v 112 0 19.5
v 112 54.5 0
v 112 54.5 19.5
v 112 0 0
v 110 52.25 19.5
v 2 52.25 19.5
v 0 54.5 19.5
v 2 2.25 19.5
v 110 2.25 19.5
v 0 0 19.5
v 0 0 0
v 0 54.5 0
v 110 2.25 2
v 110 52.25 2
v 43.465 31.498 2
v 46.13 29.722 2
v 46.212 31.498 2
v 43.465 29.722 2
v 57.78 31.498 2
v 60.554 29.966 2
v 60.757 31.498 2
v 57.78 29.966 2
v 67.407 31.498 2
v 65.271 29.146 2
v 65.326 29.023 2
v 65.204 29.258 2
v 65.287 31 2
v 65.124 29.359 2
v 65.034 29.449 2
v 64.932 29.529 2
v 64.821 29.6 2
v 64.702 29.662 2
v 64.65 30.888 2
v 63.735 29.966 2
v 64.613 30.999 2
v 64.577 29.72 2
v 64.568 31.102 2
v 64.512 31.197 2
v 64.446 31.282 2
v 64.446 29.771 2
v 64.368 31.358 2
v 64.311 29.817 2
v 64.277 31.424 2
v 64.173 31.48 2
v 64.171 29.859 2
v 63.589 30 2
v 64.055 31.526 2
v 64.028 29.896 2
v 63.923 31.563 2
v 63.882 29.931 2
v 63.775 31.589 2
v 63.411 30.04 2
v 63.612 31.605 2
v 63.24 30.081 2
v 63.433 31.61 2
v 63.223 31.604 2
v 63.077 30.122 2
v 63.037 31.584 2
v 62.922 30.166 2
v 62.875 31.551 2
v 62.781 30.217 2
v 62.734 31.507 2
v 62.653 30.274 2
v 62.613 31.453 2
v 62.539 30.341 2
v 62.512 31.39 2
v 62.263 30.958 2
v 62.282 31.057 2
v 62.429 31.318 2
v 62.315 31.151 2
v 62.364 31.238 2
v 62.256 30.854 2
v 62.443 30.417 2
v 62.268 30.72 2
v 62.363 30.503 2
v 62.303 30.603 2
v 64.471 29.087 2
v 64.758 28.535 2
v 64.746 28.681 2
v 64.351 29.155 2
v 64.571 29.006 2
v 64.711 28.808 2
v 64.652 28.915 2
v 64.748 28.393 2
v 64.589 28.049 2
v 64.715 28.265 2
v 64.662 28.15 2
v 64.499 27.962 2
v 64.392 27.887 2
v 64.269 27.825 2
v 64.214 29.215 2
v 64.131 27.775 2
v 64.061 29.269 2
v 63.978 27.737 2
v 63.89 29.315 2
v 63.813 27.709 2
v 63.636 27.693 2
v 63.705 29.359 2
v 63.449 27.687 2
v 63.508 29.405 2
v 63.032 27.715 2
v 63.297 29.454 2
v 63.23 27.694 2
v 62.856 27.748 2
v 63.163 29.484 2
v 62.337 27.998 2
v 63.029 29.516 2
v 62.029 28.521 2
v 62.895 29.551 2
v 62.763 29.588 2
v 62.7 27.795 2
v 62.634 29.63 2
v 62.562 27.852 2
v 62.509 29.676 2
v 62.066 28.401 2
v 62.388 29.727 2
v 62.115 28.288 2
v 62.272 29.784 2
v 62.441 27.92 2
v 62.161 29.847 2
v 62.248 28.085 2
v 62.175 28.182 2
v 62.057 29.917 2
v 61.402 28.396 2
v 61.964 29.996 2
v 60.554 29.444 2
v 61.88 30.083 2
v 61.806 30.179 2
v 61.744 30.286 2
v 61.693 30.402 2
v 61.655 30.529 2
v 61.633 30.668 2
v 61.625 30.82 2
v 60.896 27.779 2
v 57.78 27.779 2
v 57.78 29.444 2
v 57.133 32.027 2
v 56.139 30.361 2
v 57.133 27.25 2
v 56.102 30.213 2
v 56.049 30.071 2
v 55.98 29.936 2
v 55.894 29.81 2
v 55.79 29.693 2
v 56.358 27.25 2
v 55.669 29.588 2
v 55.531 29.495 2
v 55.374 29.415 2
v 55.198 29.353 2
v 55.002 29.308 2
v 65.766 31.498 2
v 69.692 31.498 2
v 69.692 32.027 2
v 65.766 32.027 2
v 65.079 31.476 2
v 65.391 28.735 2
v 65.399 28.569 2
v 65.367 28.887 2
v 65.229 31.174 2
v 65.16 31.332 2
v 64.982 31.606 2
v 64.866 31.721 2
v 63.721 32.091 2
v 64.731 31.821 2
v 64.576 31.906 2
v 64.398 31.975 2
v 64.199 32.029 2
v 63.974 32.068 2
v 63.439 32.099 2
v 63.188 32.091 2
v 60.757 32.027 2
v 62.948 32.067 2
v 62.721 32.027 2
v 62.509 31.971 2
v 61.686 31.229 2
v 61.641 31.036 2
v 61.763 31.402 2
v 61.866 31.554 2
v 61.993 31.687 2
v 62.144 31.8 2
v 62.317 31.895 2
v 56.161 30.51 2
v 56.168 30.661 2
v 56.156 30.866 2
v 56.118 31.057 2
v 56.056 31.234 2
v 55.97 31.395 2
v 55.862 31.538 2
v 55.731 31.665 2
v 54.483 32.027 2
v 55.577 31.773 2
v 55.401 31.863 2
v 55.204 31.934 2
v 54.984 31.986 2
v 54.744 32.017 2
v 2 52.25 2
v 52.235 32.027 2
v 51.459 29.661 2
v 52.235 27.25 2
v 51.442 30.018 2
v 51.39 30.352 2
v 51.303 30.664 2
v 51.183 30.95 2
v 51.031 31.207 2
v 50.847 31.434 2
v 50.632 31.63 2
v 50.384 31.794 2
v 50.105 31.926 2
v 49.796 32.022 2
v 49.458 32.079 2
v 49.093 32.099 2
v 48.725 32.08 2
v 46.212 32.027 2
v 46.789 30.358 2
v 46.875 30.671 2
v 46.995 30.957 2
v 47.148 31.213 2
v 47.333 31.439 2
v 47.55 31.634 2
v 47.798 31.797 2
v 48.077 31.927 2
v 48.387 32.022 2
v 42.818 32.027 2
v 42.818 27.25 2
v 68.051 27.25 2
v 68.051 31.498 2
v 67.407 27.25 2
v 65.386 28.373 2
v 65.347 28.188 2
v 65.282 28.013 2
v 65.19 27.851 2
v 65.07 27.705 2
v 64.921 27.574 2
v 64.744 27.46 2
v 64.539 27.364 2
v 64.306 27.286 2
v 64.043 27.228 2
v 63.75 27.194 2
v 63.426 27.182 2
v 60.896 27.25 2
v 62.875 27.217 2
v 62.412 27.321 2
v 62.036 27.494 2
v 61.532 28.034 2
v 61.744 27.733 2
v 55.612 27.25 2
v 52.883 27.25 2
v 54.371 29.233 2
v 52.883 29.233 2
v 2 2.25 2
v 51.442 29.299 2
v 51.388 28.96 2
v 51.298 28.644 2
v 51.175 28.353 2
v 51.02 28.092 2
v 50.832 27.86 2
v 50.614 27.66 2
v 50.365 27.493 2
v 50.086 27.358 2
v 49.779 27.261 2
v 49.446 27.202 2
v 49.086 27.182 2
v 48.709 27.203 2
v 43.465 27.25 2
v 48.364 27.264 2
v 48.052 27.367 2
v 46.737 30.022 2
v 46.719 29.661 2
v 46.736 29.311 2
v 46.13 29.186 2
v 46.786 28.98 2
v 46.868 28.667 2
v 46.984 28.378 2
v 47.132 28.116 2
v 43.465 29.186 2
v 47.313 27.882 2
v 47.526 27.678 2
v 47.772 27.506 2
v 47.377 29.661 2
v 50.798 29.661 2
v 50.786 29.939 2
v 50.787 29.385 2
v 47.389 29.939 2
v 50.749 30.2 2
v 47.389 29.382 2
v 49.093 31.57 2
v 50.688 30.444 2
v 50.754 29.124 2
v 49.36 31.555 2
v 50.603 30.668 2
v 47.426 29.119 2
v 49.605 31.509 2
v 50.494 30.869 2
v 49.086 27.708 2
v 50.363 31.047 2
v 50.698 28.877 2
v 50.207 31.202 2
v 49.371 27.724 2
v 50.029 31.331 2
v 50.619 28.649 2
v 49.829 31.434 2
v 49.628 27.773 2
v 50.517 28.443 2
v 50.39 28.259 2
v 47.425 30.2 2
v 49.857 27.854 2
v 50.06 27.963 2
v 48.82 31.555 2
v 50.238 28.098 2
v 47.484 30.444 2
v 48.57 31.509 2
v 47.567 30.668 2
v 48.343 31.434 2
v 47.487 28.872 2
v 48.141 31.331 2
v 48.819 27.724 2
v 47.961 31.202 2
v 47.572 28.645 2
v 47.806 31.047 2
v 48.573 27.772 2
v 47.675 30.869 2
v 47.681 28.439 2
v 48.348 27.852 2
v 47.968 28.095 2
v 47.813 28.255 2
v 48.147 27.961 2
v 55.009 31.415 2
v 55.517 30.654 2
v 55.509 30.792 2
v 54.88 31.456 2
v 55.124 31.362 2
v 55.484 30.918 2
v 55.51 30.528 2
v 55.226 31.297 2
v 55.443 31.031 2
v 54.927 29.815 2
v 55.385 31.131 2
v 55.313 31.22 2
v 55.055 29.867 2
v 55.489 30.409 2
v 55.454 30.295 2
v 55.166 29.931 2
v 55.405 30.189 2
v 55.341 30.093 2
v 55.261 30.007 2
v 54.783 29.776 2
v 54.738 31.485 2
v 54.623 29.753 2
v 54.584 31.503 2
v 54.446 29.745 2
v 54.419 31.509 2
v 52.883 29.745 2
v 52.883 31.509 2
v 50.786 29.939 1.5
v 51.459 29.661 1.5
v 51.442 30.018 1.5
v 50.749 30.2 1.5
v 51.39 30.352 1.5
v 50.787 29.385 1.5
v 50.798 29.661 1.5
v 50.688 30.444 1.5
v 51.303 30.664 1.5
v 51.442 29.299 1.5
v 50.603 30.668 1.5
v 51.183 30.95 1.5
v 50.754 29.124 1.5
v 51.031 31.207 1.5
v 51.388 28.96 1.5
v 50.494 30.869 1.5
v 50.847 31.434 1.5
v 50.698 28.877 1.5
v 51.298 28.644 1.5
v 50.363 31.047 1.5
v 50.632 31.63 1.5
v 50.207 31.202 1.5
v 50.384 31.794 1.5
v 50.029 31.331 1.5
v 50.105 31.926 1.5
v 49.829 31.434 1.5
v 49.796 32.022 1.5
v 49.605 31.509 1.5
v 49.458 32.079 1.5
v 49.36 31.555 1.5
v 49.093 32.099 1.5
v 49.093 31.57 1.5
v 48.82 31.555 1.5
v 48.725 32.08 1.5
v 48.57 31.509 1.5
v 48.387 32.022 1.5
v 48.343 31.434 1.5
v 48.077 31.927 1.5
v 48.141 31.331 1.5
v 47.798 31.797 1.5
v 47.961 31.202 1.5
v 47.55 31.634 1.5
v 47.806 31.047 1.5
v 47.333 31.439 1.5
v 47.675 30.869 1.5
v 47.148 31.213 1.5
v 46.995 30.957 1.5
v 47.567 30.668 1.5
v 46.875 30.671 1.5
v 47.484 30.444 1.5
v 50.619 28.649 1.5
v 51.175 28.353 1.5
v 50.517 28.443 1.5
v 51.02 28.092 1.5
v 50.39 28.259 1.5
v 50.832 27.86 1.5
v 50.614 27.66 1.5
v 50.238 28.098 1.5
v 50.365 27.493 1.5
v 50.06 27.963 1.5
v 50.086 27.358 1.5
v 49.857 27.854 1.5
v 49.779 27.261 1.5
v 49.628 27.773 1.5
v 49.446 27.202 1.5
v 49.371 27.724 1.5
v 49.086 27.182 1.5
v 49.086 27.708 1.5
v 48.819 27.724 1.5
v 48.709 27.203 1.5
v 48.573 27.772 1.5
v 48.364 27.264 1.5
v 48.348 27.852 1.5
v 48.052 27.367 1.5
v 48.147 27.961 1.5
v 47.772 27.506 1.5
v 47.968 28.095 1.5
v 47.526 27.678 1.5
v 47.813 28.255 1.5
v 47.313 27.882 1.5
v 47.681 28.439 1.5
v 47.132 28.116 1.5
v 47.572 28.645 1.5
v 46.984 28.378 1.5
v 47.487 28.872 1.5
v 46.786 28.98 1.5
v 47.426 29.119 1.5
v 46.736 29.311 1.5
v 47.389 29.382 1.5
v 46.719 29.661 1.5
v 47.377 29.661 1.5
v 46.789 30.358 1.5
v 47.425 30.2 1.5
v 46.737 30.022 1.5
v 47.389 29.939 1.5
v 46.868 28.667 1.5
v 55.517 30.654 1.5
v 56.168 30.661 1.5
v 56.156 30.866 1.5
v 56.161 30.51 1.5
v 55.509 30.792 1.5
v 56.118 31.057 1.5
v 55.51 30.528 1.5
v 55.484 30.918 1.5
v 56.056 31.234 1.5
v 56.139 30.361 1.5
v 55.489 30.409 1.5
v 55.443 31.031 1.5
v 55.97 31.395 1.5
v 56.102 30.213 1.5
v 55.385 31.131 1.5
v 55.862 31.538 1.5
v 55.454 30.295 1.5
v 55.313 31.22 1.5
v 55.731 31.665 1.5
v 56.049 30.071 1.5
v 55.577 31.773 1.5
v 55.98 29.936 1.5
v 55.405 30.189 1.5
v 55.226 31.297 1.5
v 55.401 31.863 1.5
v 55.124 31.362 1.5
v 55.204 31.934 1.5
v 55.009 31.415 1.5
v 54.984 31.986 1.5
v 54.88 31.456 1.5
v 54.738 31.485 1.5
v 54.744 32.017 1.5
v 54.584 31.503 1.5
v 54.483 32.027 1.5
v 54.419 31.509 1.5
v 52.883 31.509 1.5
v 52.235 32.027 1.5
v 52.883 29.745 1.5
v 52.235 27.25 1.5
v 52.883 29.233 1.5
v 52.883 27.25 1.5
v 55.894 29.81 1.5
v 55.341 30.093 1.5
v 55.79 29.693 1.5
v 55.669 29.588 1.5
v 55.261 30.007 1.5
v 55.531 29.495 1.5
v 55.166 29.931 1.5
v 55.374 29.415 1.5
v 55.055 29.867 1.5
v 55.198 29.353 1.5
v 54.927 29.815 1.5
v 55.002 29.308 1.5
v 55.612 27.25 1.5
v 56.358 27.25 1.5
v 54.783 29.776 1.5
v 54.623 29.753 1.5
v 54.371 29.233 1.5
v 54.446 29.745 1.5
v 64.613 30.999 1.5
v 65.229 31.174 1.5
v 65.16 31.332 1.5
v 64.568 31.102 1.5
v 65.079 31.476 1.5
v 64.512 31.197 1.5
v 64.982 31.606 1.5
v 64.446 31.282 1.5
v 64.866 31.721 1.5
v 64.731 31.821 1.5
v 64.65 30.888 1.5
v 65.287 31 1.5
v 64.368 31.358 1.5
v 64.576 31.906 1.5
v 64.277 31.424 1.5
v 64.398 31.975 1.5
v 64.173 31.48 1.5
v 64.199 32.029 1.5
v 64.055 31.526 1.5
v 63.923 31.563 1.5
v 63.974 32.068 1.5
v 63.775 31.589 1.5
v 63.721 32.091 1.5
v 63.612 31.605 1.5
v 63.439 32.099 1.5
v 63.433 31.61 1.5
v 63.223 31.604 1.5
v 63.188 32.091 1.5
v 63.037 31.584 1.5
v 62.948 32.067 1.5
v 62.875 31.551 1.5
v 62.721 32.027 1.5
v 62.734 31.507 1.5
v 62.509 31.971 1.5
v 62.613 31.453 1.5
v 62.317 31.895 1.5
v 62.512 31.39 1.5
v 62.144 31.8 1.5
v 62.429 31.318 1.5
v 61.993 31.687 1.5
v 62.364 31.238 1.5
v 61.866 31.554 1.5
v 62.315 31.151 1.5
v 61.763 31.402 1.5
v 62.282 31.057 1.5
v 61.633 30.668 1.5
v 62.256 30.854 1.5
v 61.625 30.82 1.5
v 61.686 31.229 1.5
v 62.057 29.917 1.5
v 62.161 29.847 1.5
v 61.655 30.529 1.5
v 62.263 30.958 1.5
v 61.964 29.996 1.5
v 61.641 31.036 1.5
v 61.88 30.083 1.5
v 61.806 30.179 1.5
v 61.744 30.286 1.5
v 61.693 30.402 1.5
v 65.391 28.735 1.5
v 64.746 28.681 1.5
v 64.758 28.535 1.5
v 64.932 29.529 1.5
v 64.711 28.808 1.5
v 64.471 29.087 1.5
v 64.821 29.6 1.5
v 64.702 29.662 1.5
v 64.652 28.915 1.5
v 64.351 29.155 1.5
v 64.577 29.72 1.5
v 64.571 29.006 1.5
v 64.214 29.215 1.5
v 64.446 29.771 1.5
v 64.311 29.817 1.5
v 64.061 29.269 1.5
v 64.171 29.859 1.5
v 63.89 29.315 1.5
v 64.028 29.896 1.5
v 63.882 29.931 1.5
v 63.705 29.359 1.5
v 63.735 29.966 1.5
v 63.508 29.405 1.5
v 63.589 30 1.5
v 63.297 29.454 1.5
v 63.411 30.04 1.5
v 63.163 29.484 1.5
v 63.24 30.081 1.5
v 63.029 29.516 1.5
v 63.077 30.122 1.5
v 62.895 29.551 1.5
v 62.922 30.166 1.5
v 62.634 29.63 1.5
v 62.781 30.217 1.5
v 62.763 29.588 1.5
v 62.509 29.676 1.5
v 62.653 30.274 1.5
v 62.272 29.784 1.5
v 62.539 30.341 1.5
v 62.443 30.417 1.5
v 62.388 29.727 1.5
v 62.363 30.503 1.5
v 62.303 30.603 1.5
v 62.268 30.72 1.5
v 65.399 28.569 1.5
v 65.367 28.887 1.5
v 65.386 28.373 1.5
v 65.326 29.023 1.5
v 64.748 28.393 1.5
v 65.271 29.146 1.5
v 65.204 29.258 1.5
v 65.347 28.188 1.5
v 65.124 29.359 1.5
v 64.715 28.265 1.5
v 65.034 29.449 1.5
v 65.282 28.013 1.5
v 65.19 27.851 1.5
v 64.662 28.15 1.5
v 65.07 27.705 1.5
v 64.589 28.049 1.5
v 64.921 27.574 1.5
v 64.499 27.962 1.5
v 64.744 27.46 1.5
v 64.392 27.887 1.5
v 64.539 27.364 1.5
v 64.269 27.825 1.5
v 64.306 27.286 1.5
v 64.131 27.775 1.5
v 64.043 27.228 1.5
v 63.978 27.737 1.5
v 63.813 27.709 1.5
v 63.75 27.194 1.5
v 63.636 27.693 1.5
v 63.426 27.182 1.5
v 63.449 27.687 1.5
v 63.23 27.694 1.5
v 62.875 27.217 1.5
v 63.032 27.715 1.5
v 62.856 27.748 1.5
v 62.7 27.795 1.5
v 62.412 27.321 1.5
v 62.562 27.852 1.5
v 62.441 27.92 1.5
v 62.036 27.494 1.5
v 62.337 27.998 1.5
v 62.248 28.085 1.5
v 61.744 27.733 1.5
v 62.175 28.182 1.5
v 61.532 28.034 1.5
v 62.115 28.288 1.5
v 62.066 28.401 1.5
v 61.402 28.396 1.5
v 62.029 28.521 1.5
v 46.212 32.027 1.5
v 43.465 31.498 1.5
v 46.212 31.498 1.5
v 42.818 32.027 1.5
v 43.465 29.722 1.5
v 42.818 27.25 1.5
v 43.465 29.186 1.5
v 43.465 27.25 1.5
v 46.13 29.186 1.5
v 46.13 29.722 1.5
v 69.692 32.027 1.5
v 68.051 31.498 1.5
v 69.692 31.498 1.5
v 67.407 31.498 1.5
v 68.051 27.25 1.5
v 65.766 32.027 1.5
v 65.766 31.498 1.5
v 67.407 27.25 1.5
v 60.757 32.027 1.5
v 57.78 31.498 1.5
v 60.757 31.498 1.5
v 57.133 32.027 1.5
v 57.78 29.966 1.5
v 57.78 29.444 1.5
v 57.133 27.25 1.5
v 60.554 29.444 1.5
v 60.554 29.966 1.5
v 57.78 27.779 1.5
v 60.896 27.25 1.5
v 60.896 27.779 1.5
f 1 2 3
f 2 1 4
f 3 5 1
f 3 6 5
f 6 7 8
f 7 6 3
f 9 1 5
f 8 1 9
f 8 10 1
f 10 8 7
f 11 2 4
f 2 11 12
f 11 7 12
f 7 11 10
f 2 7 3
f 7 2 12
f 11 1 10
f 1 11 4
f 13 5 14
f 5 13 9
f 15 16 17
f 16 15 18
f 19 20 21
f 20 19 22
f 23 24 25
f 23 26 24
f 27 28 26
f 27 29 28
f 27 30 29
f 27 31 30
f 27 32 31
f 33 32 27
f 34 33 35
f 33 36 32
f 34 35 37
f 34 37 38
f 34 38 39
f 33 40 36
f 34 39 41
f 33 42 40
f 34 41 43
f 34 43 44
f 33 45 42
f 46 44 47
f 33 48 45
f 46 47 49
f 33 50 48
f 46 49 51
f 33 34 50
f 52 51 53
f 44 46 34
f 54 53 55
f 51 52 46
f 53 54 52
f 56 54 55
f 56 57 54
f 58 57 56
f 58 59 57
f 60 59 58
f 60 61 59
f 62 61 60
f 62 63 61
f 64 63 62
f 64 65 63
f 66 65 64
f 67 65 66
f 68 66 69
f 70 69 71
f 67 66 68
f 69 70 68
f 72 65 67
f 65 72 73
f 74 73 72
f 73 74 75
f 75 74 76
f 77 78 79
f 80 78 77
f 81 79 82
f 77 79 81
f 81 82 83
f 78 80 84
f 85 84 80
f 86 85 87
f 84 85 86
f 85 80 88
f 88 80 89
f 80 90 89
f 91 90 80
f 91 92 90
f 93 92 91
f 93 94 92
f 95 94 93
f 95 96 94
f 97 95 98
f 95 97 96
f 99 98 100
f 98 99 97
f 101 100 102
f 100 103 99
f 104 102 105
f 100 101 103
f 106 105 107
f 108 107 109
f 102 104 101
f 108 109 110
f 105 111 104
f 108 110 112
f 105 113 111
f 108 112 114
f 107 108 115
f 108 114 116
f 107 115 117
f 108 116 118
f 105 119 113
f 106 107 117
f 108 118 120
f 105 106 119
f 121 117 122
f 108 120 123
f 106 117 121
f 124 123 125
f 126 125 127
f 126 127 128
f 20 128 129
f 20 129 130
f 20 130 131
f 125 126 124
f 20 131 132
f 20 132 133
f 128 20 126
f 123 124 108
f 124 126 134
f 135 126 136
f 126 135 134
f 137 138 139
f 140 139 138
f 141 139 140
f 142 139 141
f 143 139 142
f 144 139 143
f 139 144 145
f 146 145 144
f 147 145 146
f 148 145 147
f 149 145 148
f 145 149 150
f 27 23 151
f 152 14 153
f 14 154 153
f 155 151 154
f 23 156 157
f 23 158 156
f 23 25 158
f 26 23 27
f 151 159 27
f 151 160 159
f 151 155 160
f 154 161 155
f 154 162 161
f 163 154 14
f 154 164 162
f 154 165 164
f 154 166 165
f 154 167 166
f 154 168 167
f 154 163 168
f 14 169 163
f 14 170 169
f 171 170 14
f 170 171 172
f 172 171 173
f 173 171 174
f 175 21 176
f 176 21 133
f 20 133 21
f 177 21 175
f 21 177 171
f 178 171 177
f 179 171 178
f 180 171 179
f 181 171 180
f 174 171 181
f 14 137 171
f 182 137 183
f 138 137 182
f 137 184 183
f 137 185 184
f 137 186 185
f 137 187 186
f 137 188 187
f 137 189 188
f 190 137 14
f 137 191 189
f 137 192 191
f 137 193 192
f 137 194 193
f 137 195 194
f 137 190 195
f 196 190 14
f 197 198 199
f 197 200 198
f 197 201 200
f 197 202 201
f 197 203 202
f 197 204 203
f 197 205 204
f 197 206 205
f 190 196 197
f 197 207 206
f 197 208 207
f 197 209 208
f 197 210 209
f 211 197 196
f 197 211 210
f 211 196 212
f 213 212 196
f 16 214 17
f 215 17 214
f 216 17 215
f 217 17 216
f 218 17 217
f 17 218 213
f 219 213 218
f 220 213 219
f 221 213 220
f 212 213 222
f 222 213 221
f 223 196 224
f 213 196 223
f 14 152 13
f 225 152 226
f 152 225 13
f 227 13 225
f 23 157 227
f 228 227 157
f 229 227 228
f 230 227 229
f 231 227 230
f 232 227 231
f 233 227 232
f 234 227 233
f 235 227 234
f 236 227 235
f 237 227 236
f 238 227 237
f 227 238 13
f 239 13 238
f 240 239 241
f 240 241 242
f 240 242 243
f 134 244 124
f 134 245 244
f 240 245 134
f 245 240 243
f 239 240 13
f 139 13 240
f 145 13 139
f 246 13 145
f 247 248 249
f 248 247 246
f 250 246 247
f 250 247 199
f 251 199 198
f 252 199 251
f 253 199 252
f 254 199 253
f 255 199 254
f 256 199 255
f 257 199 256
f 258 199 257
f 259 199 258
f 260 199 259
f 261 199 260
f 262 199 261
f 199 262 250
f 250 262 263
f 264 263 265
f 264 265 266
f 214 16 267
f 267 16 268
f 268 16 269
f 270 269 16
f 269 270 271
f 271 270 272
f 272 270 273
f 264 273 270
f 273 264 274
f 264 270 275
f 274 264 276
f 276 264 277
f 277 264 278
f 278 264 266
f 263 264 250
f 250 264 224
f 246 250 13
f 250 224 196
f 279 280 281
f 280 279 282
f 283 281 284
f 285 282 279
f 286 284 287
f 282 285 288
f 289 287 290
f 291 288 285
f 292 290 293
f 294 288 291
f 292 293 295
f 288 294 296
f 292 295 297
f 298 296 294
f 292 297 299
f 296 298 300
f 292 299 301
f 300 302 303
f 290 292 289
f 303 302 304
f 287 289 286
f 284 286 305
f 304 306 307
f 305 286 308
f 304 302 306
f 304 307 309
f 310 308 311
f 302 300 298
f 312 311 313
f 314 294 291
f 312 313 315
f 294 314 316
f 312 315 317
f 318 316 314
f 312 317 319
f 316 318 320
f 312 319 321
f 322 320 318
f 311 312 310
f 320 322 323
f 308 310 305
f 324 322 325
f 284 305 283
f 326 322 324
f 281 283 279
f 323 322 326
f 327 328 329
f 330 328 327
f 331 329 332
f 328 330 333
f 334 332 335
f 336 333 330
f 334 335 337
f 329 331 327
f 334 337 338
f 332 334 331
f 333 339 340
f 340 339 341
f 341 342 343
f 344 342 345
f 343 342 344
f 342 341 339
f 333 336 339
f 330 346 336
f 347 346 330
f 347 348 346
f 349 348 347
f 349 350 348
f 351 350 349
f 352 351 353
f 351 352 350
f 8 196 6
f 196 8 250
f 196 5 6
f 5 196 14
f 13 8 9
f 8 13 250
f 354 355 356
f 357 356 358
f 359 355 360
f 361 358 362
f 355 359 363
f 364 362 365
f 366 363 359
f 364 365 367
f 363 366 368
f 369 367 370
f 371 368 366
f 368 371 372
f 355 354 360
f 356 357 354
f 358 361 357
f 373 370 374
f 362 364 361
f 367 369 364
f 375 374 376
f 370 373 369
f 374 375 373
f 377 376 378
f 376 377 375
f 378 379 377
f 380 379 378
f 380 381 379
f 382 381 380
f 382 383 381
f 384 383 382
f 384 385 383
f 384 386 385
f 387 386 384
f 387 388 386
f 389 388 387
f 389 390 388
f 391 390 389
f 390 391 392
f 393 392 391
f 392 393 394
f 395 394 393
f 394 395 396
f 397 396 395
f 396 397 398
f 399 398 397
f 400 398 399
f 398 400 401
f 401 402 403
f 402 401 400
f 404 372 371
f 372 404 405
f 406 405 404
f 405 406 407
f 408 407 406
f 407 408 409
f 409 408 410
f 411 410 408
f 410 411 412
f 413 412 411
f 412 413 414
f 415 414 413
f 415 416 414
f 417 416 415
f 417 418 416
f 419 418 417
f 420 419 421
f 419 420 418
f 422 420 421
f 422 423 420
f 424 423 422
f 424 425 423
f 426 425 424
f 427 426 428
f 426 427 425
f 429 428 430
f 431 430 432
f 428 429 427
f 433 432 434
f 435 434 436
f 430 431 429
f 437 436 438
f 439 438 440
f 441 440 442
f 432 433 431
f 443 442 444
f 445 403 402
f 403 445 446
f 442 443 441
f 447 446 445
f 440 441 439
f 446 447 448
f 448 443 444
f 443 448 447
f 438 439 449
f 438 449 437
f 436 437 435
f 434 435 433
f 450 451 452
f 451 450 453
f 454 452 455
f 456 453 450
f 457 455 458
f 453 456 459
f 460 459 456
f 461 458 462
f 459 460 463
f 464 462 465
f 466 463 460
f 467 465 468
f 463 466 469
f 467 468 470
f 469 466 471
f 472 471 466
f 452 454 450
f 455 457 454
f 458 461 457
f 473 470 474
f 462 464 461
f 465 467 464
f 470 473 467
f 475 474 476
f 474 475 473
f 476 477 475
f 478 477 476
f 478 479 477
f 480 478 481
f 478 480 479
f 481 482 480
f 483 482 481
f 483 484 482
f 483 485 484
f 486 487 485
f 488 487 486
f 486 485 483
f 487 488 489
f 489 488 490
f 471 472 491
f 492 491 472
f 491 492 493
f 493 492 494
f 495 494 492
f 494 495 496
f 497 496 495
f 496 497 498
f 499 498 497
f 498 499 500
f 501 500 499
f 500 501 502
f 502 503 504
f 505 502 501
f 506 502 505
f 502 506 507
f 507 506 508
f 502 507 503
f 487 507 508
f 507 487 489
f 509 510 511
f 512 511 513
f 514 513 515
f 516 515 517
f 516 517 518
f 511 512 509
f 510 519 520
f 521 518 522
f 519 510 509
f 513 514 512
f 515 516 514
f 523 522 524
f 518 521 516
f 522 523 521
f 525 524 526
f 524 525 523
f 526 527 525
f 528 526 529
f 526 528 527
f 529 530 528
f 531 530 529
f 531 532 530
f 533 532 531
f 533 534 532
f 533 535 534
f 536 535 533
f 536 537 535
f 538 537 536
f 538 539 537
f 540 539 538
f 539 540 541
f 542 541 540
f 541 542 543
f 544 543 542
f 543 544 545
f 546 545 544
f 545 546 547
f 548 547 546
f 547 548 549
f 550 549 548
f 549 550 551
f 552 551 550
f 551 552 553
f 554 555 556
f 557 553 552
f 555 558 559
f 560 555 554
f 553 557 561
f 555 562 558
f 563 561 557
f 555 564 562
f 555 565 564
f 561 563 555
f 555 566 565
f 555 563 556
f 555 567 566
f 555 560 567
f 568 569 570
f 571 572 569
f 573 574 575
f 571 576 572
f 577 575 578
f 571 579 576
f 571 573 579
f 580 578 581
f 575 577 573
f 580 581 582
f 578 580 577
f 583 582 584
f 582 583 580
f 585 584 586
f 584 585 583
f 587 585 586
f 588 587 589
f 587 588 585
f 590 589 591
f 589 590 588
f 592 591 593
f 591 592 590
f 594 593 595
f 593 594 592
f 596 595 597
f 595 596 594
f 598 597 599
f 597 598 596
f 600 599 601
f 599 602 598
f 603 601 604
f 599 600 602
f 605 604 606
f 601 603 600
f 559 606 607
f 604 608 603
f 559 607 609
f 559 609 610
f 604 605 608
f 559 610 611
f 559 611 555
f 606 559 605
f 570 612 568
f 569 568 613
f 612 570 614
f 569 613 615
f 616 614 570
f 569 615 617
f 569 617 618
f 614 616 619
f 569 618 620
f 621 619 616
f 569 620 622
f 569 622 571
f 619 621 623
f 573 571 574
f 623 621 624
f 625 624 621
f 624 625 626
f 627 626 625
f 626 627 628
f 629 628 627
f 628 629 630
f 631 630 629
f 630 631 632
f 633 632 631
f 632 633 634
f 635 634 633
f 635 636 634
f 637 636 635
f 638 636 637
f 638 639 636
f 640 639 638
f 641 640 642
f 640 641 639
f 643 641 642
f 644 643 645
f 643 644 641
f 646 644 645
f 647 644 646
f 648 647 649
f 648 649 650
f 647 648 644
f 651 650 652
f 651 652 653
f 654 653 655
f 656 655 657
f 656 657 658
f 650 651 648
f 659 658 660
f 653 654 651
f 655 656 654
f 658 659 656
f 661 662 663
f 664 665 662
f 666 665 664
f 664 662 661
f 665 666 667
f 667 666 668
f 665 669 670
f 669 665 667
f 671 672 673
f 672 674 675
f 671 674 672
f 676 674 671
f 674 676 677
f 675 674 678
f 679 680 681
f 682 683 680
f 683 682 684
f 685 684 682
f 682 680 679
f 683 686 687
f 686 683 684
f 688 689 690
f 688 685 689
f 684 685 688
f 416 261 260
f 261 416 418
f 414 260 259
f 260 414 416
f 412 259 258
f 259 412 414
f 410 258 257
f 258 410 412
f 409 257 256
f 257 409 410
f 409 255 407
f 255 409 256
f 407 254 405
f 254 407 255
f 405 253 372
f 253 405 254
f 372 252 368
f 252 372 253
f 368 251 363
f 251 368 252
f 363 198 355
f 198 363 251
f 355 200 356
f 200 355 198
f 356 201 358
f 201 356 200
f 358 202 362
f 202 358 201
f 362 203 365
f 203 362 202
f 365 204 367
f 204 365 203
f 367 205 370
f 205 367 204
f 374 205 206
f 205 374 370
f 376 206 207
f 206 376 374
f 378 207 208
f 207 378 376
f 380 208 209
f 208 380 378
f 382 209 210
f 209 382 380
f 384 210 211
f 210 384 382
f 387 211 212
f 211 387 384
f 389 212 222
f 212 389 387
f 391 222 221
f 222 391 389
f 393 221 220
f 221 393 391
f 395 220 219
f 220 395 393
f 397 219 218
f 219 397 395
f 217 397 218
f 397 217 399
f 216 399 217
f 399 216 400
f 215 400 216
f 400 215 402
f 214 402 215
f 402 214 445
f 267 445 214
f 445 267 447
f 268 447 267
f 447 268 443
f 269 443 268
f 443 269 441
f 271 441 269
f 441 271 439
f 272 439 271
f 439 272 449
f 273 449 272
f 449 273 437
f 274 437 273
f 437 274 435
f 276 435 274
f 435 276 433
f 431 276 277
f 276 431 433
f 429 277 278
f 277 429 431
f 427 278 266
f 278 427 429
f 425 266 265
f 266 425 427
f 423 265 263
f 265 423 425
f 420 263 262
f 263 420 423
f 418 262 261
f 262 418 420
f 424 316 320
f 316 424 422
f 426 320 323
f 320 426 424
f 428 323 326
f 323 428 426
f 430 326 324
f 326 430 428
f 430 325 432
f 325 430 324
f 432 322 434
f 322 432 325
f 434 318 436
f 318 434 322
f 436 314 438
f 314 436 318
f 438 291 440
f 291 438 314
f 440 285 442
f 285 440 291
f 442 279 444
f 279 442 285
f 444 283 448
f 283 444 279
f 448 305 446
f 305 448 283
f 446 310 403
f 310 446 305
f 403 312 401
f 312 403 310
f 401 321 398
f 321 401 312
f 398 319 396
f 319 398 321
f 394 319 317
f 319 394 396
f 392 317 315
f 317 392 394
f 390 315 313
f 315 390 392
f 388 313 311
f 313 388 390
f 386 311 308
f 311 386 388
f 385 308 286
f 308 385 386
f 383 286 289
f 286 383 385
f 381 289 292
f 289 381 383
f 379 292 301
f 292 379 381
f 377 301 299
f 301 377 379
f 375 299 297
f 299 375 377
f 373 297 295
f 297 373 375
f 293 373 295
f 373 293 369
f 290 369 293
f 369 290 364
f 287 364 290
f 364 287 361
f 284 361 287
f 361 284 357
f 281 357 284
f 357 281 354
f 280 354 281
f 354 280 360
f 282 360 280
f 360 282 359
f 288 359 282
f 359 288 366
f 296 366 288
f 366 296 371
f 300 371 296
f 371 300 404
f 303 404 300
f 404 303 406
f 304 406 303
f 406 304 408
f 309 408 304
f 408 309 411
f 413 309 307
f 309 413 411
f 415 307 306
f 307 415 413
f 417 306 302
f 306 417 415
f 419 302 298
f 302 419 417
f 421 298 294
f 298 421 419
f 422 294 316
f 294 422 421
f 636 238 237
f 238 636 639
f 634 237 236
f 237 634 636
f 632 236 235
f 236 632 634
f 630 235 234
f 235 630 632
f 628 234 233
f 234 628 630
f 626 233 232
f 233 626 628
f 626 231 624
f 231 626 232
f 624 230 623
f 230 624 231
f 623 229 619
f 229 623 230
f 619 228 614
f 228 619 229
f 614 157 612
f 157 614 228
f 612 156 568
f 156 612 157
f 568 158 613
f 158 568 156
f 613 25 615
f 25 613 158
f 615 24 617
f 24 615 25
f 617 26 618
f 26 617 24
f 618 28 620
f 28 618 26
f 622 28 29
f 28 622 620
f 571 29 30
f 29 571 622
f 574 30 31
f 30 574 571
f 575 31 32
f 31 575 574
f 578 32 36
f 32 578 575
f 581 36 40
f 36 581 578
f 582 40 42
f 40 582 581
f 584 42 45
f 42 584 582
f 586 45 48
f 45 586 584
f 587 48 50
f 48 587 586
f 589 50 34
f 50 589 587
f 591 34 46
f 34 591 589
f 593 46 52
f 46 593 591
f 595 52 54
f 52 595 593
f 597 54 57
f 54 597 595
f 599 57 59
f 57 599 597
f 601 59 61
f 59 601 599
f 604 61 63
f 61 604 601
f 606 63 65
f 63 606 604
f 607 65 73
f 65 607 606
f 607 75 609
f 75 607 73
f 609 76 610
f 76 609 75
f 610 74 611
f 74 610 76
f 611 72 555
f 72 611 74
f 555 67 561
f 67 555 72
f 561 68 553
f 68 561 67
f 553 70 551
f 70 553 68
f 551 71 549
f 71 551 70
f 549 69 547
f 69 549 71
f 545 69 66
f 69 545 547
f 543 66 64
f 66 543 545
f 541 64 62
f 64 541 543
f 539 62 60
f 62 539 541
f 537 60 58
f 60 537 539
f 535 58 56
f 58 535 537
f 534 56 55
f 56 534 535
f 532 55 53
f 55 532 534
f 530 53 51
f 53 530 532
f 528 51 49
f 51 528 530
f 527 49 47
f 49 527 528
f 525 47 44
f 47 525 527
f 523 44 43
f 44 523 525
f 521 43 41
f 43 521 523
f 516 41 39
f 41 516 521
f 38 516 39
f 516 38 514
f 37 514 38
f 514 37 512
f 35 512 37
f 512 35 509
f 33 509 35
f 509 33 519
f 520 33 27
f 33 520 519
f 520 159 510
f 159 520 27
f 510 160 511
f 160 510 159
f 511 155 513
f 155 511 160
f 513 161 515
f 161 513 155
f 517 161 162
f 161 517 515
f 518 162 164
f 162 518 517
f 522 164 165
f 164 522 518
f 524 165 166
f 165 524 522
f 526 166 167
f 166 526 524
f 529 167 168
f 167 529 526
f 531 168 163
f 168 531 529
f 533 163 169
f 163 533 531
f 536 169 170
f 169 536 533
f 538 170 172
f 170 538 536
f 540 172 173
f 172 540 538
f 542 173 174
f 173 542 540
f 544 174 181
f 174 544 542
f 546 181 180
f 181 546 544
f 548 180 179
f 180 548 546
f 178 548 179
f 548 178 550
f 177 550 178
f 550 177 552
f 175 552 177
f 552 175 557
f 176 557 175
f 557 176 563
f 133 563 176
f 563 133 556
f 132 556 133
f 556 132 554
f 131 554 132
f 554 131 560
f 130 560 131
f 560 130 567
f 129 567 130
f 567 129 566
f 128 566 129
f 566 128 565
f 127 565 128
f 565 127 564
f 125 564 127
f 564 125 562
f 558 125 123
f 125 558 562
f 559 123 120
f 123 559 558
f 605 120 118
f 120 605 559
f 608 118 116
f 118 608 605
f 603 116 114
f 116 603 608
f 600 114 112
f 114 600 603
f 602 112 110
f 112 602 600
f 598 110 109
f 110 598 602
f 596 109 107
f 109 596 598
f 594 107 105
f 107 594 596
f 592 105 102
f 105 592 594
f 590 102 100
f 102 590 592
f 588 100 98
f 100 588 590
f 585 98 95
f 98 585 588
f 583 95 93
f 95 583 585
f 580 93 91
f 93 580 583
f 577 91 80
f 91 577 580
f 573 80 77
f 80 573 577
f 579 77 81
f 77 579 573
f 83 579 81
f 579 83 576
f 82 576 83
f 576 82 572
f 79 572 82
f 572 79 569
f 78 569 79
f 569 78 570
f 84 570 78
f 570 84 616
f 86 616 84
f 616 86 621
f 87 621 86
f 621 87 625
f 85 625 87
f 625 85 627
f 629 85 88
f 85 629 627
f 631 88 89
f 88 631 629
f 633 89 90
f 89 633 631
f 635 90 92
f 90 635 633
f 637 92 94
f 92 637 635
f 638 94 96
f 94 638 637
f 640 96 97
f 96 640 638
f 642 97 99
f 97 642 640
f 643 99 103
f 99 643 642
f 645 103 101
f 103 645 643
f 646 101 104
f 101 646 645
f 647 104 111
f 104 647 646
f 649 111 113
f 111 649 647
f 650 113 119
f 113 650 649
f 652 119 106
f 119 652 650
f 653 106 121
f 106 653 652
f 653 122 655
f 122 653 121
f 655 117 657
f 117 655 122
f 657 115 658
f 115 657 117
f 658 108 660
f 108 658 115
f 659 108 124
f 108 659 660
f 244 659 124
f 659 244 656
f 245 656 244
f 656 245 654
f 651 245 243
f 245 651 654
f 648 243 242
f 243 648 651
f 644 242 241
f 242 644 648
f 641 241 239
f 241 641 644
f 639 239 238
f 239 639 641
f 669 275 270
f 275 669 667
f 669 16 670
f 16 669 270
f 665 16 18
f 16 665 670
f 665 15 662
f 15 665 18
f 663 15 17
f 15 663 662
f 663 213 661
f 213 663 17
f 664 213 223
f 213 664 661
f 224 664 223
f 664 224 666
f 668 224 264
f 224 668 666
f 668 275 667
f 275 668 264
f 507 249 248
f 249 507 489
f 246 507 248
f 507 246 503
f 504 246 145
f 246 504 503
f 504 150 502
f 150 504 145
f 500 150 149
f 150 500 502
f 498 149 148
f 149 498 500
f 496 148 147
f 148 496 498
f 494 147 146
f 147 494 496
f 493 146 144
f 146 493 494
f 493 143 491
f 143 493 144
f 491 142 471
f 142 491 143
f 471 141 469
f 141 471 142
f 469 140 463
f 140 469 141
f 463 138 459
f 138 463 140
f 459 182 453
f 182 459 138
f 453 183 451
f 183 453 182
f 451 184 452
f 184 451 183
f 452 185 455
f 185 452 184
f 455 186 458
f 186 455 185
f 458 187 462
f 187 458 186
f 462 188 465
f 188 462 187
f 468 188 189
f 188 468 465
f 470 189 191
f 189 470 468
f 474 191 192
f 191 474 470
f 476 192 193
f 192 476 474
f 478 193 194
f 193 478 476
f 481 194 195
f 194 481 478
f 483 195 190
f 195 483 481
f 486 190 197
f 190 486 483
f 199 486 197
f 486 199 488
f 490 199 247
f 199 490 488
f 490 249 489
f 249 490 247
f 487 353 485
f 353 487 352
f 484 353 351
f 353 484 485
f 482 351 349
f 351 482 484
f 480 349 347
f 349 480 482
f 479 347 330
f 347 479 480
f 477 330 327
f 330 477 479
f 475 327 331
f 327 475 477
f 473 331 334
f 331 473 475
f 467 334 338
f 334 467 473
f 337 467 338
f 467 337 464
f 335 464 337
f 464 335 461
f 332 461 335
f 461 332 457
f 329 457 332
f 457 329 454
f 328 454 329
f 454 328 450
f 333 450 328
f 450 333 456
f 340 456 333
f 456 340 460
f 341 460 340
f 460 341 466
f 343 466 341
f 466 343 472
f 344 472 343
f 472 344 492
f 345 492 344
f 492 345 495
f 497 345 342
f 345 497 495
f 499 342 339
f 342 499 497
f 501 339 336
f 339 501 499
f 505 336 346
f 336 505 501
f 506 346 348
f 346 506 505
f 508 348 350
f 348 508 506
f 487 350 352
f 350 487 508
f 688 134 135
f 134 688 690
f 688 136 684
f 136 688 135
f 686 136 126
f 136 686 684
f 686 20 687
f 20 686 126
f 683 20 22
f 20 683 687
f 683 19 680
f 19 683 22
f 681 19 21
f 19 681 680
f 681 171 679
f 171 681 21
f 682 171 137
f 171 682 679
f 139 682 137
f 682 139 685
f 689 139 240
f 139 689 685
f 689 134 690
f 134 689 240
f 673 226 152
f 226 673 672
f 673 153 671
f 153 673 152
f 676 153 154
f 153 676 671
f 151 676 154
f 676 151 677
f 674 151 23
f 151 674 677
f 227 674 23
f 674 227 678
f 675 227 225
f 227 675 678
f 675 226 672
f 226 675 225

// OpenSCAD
// file: consts.scad
BUILDING_W = 53; // Measured about 52mm
BUILDING_D = 35; // Measured about 34mm
BUILDING_H = 2;

BUILDING_GRIP_PCG = 0.5;

FOREST_W = 108; // Measured about 107
FOREST_D = BUILDING_D;
FOREST_H = BUILDING_H;

PRODUCTION_BOARD_W = 126;
PRODUCTION_BOARD_D = 241;

CARD_W = 57.5; // Measured 56.98
CARD_D = 88; // Measured 87.20
// main file
include <consts.scad>;

WALL = 2;
FLOOR = 2;

TEXT_H = 0.5;

BOX_W = FOREST_W + WALL * 2;
BOX_D = 90 - 33.5 - 2; // Size such it will fit next to the Goods tokens

difference() {
    cube([BOX_W, BOX_D, FLOOR + FOREST_D * BUILDING_GRIP_PCG]);
    translate([WALL, (BOX_D - FOREST_H * 25)/2, FLOOR]) cube([FOREST_W, FOREST_H * 25, FOREST_D]); // Processing

    translate([BOX_W/2, BOX_D/2,0]) say("FOREST");
}

module say(msg) {
    color("blue") translate([0,0,FLOOR-TEXT_H]) linear_extrude(TEXT_H) text(msg, size=5, halign="center", valign="middle");
}
